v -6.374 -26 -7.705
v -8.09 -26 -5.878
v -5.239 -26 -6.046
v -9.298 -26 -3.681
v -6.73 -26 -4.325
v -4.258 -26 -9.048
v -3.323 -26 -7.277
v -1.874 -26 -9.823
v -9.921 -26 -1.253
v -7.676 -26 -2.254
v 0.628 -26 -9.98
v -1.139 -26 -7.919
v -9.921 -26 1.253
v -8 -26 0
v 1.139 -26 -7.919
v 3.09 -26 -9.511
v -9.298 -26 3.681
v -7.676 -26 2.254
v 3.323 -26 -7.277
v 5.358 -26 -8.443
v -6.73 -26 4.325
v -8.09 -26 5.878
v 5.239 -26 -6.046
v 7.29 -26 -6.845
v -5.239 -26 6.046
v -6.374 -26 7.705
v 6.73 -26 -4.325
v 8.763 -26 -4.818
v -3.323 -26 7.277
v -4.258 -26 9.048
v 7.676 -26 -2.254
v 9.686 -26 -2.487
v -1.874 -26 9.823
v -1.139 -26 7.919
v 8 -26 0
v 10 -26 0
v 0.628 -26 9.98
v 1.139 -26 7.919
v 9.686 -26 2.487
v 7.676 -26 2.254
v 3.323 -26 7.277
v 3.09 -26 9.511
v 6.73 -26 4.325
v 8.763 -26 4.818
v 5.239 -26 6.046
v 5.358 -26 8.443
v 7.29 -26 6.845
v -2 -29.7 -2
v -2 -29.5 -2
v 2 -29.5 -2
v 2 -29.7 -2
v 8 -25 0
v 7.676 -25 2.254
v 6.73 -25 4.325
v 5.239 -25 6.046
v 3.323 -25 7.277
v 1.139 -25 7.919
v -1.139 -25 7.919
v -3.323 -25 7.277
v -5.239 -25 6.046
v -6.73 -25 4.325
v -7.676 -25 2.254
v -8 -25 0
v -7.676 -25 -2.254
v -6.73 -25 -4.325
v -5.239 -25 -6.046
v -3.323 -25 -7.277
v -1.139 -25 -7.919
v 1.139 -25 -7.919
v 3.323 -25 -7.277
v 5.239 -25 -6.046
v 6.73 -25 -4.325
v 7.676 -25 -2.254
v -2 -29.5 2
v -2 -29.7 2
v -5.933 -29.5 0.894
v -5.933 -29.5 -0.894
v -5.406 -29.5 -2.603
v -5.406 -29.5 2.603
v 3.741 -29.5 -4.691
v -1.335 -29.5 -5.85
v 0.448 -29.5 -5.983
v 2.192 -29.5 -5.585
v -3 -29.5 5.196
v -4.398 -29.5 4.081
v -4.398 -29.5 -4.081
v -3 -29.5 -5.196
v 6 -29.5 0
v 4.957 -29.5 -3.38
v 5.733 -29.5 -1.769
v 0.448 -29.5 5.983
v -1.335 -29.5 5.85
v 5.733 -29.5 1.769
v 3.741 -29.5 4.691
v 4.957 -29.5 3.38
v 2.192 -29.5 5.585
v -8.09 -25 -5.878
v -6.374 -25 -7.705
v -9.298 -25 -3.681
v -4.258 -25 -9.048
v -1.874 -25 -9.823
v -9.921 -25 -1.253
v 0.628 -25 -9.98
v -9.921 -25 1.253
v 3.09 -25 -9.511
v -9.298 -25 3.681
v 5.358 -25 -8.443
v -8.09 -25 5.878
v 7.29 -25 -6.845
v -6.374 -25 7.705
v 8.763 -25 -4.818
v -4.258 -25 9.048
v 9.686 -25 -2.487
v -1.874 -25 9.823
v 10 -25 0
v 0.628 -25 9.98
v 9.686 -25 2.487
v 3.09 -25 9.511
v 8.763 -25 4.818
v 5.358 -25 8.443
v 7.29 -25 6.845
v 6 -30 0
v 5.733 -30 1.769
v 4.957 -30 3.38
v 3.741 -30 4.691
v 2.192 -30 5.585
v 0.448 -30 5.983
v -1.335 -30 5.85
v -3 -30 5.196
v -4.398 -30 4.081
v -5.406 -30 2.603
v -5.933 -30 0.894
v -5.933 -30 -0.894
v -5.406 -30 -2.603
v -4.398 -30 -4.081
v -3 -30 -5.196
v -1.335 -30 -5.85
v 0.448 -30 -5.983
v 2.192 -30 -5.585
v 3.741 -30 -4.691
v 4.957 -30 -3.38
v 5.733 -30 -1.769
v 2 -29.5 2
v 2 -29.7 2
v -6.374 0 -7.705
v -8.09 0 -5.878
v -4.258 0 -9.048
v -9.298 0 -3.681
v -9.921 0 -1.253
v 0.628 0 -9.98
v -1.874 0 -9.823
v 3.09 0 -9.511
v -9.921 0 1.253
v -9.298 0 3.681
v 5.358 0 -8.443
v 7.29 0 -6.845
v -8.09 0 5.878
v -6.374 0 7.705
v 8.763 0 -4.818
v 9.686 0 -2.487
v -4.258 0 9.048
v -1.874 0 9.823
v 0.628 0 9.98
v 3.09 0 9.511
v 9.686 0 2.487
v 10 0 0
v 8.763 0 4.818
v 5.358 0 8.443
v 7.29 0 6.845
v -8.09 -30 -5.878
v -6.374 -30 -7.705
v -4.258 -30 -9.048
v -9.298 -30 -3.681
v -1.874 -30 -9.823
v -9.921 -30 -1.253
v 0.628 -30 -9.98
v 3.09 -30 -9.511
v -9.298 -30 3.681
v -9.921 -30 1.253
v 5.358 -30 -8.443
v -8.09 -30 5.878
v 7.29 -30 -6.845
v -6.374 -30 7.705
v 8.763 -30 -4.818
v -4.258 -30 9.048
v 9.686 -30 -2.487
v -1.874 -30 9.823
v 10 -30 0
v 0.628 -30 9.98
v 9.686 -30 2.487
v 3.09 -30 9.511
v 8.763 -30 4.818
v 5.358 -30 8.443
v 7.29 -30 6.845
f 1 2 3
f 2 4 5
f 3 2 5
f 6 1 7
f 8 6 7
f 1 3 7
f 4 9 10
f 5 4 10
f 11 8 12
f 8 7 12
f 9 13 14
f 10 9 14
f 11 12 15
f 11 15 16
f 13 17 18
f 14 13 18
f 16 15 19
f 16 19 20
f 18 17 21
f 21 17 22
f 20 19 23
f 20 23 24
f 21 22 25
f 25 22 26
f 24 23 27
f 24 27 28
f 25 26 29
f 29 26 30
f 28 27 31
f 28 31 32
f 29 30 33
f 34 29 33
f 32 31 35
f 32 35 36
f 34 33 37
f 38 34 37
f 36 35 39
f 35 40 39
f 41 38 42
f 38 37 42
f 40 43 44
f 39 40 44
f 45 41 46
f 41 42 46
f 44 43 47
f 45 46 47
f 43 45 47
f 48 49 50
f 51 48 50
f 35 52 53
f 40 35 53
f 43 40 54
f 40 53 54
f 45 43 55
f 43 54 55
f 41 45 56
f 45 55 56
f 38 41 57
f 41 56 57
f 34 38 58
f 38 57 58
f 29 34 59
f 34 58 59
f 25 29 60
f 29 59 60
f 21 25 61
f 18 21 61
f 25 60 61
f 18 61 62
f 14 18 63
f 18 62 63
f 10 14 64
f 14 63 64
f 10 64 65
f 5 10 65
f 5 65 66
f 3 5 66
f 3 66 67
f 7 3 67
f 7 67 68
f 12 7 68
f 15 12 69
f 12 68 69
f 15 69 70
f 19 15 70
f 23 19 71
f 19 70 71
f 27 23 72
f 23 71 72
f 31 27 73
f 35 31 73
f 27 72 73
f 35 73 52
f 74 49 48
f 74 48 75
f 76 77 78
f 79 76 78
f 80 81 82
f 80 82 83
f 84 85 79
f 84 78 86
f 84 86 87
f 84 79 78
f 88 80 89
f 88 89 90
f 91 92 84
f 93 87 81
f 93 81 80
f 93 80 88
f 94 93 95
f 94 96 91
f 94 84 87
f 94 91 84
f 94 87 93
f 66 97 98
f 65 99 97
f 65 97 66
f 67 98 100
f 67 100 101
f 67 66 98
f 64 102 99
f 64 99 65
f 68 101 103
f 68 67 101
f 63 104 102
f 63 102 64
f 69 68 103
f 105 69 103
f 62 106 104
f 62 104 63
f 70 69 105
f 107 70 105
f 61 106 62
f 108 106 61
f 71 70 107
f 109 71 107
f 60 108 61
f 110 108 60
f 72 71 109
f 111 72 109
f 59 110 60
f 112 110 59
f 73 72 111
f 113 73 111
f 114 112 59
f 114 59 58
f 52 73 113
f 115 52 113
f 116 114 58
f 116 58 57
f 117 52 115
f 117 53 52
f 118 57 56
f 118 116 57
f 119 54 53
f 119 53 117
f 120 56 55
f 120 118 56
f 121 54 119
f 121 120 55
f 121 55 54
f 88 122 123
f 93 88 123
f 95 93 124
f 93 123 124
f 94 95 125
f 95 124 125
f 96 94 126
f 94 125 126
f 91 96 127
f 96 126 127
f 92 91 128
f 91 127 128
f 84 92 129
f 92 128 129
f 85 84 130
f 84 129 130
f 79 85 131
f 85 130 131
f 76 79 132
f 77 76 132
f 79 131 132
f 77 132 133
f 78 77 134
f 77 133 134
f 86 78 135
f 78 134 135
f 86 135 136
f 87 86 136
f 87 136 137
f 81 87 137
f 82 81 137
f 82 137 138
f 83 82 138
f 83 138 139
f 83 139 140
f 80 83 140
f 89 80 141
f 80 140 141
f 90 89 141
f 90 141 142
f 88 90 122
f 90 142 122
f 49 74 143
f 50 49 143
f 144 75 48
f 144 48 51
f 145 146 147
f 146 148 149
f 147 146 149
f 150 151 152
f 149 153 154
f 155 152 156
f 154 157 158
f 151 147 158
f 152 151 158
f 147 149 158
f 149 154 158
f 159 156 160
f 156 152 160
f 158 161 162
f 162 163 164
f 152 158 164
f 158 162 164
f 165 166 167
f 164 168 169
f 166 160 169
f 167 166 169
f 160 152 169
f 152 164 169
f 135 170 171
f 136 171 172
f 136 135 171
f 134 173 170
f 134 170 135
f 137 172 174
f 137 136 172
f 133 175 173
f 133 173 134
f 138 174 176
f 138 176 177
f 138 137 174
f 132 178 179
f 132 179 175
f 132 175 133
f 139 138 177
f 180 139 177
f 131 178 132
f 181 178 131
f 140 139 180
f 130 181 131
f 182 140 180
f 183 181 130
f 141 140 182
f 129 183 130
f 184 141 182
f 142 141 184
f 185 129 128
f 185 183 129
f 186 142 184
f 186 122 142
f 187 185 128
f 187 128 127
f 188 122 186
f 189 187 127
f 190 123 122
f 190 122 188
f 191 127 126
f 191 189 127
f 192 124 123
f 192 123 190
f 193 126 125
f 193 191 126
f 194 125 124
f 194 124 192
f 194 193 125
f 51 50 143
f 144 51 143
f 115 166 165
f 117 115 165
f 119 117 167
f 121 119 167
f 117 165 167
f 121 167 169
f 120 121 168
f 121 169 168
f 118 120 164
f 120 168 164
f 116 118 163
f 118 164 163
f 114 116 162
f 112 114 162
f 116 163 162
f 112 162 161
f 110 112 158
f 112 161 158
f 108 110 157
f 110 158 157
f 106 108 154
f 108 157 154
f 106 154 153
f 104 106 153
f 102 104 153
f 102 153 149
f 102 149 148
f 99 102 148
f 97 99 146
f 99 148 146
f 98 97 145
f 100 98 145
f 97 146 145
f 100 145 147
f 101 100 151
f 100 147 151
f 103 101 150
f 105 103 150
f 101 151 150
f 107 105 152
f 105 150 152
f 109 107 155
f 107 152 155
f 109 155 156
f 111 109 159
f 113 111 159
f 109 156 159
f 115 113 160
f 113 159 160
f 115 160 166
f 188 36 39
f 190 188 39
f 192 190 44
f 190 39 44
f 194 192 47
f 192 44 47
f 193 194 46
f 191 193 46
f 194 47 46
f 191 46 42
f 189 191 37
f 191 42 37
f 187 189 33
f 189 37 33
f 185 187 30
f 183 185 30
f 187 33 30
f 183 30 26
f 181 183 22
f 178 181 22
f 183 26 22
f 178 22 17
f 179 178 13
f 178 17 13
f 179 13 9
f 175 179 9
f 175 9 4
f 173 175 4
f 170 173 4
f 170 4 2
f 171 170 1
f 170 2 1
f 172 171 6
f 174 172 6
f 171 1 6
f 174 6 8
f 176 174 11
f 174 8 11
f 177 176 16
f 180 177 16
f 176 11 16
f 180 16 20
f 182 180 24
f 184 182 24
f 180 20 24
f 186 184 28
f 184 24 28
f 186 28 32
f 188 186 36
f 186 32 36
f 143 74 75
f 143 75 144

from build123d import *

# Parameters (mm, degrees)
F0_R     = 10
F1_DEPTH = 25
F2_R     = 8
F3_DEPTH = 1
F4_R     = 10
F4_R_2   = 8
F5_DEPTH = 4
F6_R     = 6
F7_DEPTH = 0.5
F8_W     = 4
F8_H     = 4
F9_DEPTH = 0.2


with BuildPart() as f1:
    # F0 (on Front) → F1 (new body)
    with BuildSketch(Plane.XZ):
        Circle(F0_R)
    extrude(amount=F1_DEPTH)

    # F2 (on face) → F3 (join)
    with BuildSketch(Plane.XZ.offset(25)):
        Circle(F2_R)
    extrude(amount=F3_DEPTH)

    # F4 (on face) → F5 (join)
    with BuildSketch(Plane.XZ.offset(26)):
        Circle(F4_R)
        Circle(F4_R_2, mode=Mode.SUBTRACT)
        Circle(F4_R_2)
    extrude(amount=F5_DEPTH)

    # F6 (on face) → F7 (cut)
    with BuildSketch(Plane.XZ.offset(30)):
        Circle(F6_R)
    extrude(amount=-F7_DEPTH, mode=Mode.SUBTRACT)


with BuildPart() as f9:
    # F8 (on face) → F9 (new body)
    with BuildSketch(Plane.XZ.offset(29.5)):
        Rectangle(F8_W, F8_H)
    extrude(amount=F9_DEPTH)


solid = Compound([f1.part, f9.part])
